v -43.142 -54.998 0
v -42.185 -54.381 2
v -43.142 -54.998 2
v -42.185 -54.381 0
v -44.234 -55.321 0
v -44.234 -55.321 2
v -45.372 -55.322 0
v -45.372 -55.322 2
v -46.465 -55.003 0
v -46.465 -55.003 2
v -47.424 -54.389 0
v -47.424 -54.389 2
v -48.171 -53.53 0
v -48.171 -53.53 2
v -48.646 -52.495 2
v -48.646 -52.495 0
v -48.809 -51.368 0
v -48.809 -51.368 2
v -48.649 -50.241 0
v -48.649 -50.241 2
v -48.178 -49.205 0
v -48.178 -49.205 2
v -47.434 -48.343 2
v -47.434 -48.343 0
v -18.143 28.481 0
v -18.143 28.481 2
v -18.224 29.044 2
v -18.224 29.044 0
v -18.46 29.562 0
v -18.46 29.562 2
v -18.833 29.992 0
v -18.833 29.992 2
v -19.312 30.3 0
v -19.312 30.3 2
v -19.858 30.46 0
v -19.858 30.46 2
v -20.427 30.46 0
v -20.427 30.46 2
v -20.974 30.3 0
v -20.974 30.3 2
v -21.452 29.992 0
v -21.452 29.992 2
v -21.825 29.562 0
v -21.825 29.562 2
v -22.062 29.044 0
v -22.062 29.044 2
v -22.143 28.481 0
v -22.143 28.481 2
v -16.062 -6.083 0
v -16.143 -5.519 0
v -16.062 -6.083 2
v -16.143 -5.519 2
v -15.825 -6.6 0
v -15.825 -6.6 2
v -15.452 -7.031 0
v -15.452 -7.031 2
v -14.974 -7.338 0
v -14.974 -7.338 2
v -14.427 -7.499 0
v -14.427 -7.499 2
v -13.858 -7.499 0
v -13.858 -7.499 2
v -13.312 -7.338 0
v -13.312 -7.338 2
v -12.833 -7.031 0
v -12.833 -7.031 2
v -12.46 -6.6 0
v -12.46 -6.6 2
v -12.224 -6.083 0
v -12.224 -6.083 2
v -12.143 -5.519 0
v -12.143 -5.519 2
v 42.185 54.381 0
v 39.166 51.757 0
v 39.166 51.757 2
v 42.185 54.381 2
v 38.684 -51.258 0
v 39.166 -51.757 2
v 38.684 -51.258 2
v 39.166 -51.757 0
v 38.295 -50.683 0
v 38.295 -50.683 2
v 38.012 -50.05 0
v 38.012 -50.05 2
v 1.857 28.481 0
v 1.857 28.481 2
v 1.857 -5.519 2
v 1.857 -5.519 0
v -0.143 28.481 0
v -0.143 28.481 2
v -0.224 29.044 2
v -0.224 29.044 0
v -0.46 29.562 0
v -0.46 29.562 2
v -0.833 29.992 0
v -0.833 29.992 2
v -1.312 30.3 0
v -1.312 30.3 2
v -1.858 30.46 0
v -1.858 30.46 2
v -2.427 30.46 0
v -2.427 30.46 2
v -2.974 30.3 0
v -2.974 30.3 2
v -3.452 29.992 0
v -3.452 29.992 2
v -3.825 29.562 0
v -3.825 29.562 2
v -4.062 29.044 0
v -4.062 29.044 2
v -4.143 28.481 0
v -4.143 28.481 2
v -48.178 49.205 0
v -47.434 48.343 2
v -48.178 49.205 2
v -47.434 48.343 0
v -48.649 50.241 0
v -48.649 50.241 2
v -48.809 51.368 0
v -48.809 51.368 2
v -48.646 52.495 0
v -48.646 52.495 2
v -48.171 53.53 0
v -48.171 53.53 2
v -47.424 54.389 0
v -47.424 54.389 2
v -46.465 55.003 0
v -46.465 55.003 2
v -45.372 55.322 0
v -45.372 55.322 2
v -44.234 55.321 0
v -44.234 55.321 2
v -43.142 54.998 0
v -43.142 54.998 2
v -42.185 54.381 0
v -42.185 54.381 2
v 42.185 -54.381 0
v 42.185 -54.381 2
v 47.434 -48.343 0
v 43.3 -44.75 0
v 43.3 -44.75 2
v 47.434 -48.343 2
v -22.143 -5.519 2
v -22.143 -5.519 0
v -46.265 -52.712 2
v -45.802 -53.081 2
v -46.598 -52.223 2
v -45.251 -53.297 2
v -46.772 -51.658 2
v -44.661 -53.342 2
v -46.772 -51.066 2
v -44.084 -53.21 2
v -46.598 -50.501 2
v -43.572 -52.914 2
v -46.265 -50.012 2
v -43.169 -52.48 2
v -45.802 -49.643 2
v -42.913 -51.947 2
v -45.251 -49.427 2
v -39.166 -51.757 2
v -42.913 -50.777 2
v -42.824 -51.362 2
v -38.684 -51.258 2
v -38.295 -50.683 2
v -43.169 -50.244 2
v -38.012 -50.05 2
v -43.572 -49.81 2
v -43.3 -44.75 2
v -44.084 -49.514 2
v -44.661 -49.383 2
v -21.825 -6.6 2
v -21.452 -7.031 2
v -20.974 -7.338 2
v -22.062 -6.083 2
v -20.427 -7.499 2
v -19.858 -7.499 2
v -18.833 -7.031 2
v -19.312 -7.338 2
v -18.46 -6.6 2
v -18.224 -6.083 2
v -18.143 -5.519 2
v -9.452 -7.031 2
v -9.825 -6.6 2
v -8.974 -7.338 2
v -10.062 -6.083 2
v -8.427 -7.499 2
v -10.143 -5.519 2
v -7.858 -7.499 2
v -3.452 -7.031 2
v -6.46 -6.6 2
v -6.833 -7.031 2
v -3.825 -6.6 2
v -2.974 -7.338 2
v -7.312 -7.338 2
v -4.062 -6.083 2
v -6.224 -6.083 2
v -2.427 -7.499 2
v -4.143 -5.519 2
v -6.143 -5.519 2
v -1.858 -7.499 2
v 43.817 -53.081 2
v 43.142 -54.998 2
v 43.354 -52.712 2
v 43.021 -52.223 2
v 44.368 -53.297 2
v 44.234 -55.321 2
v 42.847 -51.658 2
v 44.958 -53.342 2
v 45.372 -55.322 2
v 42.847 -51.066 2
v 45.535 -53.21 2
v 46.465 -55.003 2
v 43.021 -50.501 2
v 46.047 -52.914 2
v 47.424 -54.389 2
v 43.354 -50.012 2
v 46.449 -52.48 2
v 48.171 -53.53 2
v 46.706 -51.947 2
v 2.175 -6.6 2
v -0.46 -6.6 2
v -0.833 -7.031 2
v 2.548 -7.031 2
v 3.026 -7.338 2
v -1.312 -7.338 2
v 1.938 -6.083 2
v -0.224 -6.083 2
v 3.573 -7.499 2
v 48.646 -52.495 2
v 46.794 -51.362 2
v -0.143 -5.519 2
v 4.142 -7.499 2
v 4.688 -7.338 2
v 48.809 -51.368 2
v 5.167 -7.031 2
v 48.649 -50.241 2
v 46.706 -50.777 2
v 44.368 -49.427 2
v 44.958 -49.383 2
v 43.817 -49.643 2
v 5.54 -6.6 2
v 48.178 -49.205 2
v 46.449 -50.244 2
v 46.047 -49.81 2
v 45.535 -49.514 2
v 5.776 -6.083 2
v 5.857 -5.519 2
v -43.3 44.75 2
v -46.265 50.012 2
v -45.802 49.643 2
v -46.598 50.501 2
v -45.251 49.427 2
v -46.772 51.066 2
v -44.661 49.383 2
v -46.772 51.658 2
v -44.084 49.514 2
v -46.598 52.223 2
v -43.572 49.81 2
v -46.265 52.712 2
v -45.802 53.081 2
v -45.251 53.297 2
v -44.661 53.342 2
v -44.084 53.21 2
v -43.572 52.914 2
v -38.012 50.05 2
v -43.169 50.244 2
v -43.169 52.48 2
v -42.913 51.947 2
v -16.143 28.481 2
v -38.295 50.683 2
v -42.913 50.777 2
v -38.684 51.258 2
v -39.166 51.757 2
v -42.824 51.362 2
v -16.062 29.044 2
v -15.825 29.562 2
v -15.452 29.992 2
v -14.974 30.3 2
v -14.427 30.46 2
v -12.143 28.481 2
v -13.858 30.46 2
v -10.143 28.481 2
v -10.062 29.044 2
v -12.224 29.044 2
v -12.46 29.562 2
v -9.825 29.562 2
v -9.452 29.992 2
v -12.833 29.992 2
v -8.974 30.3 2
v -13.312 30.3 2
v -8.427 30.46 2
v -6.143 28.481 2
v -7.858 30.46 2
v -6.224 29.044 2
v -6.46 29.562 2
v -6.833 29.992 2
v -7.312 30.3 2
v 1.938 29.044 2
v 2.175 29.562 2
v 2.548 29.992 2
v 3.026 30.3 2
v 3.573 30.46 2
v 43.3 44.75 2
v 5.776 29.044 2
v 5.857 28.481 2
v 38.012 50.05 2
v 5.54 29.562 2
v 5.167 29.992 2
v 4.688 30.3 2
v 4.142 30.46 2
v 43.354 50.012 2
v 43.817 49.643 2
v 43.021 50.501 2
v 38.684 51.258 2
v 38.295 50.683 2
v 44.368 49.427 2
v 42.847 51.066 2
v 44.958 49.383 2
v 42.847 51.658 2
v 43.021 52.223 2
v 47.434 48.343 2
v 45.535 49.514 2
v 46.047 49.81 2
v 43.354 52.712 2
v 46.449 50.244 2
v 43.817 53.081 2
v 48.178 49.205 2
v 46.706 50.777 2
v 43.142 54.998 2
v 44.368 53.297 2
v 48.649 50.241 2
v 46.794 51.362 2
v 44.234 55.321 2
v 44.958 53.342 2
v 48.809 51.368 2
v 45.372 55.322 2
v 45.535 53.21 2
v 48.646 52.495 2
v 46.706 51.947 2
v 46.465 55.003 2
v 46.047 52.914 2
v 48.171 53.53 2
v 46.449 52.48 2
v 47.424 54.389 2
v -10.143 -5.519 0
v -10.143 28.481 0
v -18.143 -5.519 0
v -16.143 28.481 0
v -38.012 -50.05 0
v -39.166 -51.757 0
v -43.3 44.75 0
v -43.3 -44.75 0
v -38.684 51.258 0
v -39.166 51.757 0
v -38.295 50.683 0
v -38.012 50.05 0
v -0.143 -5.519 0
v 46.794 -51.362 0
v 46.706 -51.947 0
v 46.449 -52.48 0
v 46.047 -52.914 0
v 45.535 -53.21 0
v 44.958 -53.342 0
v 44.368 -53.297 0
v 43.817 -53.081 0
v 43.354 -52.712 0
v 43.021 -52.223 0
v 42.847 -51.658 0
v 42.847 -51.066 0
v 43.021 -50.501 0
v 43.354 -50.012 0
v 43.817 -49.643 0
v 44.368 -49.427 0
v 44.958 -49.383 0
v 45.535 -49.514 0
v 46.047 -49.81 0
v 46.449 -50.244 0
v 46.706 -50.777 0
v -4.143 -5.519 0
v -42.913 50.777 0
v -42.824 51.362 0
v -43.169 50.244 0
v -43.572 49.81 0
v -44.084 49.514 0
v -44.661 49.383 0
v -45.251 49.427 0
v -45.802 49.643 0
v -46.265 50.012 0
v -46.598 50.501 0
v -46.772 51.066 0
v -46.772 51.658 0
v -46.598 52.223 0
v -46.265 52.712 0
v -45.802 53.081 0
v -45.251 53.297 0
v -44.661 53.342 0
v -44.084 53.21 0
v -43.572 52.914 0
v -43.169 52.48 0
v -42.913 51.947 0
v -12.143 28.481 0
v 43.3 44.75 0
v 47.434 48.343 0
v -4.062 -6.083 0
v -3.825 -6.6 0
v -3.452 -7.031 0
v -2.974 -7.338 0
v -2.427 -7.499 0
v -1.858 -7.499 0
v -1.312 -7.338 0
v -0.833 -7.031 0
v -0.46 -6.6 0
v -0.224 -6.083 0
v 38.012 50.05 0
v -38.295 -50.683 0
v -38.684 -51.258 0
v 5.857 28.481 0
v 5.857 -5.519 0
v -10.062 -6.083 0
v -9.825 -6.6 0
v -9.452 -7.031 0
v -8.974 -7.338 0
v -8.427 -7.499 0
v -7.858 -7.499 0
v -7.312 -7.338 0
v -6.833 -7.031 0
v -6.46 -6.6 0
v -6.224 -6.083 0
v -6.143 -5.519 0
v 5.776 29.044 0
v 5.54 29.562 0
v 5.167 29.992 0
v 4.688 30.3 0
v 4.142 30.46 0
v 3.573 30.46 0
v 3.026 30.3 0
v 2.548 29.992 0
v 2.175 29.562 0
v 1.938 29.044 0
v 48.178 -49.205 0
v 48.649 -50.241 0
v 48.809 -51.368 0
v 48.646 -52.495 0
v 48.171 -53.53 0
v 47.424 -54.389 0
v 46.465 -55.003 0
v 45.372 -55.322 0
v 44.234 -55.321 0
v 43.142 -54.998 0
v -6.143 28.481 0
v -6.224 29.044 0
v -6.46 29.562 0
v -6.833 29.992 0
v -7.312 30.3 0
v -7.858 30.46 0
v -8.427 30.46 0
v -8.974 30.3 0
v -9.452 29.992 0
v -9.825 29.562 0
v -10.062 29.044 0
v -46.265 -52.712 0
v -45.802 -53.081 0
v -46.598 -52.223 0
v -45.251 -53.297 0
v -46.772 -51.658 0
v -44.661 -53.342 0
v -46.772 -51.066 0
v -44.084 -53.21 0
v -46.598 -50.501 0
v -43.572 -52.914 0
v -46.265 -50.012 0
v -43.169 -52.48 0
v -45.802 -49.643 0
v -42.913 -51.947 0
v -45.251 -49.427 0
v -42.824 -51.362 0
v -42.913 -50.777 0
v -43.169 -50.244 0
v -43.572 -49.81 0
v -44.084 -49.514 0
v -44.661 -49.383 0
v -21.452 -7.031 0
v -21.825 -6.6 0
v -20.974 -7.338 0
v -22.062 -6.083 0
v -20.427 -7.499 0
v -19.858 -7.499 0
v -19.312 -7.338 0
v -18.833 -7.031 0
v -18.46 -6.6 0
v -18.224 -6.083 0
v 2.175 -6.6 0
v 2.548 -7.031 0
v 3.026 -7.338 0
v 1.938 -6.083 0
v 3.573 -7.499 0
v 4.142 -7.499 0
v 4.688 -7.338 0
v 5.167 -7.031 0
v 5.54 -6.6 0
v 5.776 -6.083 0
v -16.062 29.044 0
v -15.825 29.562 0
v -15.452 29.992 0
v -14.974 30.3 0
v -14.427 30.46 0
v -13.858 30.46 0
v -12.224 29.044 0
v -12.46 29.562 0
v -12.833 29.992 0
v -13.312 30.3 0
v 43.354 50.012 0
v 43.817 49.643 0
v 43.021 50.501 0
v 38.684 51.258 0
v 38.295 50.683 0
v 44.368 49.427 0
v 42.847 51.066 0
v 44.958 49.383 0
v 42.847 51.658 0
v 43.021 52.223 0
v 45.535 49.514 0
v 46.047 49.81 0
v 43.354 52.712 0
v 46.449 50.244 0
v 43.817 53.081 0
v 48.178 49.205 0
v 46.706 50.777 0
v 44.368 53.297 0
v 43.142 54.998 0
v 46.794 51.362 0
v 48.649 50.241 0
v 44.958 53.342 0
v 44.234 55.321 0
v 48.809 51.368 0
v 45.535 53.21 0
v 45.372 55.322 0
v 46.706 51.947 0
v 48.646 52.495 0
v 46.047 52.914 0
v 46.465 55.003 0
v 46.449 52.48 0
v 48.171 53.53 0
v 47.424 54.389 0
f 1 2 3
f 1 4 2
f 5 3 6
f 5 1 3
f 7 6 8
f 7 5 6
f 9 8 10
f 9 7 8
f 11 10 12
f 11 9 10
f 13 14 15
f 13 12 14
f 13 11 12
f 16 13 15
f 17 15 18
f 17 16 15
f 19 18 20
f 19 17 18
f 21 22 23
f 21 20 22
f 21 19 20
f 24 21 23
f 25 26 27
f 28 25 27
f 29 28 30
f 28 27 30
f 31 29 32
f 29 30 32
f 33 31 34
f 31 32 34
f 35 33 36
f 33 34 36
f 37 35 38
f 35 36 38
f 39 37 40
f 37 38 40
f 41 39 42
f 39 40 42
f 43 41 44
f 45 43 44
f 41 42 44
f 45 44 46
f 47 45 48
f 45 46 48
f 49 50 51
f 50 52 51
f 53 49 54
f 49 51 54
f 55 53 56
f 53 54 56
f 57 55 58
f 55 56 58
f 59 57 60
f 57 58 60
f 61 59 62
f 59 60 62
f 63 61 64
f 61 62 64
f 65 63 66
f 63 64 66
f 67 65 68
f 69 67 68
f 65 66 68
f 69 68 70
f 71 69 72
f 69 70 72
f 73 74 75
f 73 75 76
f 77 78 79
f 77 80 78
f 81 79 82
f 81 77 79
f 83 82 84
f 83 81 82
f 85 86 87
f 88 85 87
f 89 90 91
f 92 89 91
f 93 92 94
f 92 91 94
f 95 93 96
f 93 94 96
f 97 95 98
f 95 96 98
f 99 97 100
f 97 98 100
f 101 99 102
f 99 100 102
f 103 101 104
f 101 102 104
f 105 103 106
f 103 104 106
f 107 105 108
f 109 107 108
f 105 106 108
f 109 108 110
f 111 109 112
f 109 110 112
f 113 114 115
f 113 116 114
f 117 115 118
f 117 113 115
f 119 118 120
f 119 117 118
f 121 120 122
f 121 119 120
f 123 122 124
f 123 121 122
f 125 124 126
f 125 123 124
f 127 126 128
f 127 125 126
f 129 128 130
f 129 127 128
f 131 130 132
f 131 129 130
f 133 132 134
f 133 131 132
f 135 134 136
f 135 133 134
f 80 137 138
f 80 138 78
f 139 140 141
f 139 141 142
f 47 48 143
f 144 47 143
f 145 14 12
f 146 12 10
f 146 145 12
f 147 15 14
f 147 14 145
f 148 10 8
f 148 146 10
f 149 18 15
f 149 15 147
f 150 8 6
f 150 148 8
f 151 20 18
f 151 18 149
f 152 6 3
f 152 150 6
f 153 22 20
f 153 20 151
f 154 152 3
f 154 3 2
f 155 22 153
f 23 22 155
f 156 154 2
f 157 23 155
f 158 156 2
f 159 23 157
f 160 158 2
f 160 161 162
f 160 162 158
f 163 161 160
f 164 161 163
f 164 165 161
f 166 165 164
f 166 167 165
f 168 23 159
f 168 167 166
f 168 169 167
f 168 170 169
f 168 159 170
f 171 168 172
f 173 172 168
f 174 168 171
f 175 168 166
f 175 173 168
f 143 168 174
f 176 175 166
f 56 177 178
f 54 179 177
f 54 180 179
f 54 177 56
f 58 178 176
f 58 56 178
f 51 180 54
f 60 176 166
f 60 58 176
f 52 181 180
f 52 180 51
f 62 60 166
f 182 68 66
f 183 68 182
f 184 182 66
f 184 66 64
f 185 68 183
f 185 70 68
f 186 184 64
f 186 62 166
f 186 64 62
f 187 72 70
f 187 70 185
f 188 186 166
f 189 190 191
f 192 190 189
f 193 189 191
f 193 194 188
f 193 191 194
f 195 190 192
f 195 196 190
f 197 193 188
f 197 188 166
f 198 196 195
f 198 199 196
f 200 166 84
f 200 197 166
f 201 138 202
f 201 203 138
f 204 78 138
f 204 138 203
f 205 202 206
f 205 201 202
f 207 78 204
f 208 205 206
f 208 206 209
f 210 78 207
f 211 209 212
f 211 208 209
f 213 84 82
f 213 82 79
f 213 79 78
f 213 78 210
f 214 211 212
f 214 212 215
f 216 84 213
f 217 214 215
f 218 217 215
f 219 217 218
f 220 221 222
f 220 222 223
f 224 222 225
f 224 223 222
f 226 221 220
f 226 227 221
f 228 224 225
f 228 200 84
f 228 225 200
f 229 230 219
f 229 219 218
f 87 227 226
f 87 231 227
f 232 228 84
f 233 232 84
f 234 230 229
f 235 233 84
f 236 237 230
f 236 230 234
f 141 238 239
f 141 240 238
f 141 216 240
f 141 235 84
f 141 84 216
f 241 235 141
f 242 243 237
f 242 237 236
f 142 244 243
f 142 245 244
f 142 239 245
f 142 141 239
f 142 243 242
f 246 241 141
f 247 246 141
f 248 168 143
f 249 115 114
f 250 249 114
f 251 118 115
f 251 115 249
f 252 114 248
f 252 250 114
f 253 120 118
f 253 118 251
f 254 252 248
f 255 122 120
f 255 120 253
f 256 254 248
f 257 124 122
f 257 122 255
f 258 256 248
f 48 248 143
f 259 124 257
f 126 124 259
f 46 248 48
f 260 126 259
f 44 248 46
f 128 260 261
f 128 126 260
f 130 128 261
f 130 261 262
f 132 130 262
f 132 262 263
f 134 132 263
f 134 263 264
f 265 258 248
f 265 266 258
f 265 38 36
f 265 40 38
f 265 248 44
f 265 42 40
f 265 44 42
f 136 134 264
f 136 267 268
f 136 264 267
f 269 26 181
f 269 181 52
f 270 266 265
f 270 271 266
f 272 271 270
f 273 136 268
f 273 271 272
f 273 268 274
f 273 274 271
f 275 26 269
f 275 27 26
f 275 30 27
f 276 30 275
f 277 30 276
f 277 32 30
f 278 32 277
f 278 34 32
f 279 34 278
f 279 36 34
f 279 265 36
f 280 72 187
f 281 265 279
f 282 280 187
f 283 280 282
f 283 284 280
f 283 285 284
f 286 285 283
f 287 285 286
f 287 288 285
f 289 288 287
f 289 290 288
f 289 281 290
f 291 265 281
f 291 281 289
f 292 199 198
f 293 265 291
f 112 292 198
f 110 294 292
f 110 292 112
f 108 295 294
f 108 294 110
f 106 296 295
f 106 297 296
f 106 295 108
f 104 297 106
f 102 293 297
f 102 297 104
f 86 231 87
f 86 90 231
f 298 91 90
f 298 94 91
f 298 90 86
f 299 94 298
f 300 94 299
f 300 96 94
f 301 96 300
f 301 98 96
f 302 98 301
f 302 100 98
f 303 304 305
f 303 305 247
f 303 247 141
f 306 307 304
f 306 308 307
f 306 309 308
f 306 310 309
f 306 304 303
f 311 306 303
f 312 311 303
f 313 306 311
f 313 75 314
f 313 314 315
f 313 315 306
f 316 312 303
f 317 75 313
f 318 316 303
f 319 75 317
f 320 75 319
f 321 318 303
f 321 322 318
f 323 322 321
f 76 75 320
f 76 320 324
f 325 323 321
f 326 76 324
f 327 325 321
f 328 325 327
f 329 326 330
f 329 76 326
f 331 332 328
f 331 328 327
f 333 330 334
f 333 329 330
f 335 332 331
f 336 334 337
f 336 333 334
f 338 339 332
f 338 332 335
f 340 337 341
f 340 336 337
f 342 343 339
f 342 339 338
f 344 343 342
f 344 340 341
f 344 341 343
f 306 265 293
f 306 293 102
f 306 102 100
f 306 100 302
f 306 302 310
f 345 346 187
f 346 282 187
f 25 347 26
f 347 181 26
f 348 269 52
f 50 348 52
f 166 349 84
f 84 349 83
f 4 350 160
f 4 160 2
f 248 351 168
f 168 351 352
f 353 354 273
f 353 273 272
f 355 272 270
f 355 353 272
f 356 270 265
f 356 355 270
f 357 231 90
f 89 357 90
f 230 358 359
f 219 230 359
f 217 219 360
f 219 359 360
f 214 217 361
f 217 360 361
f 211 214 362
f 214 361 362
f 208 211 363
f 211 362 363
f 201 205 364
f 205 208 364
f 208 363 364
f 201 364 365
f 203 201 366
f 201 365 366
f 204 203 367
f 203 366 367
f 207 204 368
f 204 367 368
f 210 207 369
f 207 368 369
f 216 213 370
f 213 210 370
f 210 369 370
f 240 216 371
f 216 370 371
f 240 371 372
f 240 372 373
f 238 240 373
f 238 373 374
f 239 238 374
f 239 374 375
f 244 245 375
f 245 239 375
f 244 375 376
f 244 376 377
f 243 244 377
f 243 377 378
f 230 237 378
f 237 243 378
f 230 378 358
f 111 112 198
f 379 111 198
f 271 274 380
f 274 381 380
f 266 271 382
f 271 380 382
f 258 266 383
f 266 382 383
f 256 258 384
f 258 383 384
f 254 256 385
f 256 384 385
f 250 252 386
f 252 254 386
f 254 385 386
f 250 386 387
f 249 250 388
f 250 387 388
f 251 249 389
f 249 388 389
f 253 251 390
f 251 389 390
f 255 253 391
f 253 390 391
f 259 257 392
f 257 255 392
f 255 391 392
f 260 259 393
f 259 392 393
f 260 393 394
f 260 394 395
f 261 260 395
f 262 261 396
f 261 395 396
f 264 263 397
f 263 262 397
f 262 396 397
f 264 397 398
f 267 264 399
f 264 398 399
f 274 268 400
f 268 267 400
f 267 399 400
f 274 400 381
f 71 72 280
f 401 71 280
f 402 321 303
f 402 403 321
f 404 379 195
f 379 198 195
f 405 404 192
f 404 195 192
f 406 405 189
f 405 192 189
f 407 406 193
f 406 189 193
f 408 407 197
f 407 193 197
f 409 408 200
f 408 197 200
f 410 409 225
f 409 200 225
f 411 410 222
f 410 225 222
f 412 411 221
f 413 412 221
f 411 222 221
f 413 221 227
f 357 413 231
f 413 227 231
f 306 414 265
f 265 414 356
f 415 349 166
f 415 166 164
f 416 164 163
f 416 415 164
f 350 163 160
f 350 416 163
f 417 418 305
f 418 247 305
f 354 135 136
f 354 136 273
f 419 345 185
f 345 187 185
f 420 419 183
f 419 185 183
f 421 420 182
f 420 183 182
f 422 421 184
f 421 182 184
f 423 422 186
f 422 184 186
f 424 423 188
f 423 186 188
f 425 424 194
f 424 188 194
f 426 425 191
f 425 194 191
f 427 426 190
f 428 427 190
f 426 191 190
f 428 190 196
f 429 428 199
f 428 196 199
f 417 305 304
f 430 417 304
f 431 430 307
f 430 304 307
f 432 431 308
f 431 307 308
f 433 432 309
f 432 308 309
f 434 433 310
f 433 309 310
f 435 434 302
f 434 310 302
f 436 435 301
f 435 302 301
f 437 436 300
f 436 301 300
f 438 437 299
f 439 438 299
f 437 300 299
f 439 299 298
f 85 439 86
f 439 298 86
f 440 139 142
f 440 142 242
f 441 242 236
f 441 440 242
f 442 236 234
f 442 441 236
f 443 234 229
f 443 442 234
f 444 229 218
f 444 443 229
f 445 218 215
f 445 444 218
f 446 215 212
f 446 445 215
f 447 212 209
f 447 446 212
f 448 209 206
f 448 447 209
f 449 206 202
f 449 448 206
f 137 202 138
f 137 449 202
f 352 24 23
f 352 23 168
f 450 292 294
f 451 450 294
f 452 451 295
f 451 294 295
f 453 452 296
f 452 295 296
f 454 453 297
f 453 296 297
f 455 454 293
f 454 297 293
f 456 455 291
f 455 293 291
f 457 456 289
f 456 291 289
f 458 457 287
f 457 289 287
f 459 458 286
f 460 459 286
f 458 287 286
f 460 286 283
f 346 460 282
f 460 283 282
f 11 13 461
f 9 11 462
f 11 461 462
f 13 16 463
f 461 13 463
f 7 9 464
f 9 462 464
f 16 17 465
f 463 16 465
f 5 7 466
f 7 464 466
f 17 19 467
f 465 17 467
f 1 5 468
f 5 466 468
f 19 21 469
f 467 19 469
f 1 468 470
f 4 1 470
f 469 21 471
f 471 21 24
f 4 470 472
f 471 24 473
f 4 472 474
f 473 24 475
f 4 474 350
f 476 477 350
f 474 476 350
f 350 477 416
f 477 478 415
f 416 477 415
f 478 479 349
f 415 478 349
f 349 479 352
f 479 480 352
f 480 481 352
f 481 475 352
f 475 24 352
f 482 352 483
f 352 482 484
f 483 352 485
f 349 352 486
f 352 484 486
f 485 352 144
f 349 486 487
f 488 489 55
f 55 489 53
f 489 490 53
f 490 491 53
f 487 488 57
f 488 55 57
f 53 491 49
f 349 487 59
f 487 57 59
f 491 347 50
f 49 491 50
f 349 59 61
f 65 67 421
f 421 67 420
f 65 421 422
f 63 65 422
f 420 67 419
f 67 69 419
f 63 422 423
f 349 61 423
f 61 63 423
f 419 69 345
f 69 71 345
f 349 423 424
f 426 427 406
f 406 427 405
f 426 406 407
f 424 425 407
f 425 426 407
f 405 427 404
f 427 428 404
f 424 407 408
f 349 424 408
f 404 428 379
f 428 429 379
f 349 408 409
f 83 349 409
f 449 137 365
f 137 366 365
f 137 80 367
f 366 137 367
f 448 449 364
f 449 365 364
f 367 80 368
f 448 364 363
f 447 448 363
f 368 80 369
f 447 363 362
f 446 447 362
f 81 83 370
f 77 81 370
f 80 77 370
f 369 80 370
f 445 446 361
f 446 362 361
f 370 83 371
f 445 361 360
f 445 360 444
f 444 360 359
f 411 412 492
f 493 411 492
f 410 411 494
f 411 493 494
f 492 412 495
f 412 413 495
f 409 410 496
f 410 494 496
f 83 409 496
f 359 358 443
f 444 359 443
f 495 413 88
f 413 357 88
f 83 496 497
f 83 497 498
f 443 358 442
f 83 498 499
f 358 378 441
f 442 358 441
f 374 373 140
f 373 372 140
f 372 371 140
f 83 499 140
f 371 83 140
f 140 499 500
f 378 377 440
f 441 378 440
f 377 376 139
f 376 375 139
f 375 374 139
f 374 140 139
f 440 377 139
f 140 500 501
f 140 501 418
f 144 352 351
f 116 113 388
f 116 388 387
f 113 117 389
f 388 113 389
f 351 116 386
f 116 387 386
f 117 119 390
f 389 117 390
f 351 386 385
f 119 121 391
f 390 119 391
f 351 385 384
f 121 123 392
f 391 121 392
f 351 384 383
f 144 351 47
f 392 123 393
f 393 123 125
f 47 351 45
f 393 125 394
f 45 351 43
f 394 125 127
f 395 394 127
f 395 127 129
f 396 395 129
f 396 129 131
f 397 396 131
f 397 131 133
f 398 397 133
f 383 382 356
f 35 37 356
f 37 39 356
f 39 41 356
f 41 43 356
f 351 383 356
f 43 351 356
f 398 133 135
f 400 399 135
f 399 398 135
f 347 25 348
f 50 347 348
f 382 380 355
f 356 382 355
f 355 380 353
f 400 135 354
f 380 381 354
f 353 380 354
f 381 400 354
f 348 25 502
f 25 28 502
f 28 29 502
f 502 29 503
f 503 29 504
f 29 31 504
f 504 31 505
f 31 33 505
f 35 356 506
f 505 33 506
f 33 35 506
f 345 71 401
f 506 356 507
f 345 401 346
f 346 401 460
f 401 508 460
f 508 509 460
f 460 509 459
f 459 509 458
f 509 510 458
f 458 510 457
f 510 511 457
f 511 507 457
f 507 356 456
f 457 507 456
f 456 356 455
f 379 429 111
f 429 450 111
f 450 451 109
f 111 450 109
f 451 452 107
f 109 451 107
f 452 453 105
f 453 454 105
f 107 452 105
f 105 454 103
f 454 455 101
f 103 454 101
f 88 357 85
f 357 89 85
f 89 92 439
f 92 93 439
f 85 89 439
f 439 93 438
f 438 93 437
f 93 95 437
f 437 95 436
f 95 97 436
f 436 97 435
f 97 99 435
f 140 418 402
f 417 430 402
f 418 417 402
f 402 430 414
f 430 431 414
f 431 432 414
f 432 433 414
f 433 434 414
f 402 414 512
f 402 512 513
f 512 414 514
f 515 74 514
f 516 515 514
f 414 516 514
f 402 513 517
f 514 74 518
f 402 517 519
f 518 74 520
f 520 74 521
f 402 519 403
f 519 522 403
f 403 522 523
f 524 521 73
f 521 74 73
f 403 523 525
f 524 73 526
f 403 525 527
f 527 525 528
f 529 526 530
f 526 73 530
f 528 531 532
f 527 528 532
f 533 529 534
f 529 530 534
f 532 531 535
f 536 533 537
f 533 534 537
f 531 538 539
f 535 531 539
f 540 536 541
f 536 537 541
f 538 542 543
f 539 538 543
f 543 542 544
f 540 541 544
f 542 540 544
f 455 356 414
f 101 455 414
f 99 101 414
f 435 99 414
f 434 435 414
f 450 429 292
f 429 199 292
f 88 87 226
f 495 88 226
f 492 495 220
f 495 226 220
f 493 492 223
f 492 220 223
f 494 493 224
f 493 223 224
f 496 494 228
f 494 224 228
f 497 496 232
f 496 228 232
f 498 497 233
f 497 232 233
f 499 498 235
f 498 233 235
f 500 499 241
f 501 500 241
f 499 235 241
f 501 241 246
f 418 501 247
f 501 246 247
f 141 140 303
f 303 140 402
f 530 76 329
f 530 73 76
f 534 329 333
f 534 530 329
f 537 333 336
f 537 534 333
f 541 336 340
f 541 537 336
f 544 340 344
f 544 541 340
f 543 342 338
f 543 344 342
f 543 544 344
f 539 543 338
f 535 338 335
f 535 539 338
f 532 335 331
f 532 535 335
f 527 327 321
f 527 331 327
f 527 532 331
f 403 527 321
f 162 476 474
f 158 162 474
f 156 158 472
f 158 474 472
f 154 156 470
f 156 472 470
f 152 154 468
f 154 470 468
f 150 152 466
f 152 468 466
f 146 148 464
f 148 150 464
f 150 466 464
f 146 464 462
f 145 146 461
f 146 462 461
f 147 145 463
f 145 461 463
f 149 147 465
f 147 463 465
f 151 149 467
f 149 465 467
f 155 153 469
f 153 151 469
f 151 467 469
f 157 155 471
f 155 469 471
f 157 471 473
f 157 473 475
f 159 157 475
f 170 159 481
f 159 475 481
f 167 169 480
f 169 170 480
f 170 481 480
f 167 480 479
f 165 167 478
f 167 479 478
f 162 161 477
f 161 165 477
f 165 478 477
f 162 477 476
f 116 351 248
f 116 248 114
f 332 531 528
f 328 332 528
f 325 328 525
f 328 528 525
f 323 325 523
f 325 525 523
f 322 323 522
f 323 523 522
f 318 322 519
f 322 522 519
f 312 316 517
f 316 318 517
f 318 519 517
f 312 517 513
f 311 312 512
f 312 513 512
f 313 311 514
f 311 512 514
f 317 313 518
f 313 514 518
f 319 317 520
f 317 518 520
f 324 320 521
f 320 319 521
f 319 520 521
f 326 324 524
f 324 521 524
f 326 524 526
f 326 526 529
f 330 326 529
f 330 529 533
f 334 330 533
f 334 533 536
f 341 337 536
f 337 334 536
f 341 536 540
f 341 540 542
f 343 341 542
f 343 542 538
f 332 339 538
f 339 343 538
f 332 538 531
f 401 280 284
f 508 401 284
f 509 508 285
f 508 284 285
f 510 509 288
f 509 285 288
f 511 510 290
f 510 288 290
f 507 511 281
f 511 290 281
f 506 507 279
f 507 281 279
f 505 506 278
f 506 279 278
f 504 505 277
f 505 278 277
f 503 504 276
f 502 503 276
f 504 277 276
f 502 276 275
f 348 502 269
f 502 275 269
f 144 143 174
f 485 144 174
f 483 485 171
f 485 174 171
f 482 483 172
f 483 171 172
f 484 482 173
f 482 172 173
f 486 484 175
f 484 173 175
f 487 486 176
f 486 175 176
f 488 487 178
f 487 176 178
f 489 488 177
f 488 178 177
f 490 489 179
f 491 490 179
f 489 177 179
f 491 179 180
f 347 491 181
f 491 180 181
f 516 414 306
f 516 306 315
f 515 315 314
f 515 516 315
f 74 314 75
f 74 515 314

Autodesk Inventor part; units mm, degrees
ref_plane "YZ Plane" through (0, 0, 0) normal (1, 0, 0) x (0, 1, 0)
ref_plane "XZ Plane" through (0, 0, 0) normal (0, 1, 0) x (-1, 0, 0)
ref_plane "XY Plane" through (0, 0, 0) normal (0, 0, 1) x (1, 0, 0)
sketch "Sketch1" plane through (0, 0, 0) normal (0, 0, 1) x (1, 0, 0)
  circle A0 centre (44.8094, -51.3621) radius 1.985 projected
  circle A1 centre (-44.8094, -51.3621) radius 1.985 projected
  circle A2 centre (-44.8094, 51.3621) radius 1.985 projected
  circle A3 centre (44.8094, 51.3621) radius 1.985 projected
  line L0 (38.0119, 50.05) -> (-38.0119, 50.05) projected
  arc A4 (-38.0119, 50.05) -> (-39.1663, 51.7567) centre (-41.7906, 48.7379) ccw projected
  line L1 (-42.1852, 54.381) -> (-39.1663, 51.7567) projected
  arc A5 (-42.1852, 54.381) -> (-47.4337, 48.3433) centre (-44.8094, 51.3621) ccw projected
  line L2 (-43.3, 44.7499) -> (-47.4337, 48.3433) projected
  line L3 (-43.3, 44.7499) -> (-43.3, -44.7499) projected
  line L4 (-47.4337, -48.3433) -> (-43.3, -44.7499) projected
  arc A6 (-47.4337, -48.3433) -> (-42.1852, -54.381) centre (-44.8094, -51.3621) ccw projected
  line L5 (-39.1663, -51.7567) -> (-42.1852, -54.381) projected
  arc A7 (-39.1663, -51.7567) -> (-38.0119, -50.05) centre (-41.7906, -48.7379) ccw projected
  line L6 (-38.0119, -50.05) -> (38.0119, -50.05) projected
  arc A8 (38.0119, -50.05) -> (39.1663, -51.7567) centre (41.7906, -48.7379) ccw projected
  line L7 (42.1852, -54.381) -> (39.1663, -51.7567) projected
  arc A9 (42.1852, -54.381) -> (47.4337, -48.3433) centre (44.8094, -51.3621) ccw projected
  line L8 (43.3, -44.7499) -> (47.4337, -48.3433) projected
  line L9 (43.3, -44.7499) -> (43.3, 44.7499) projected
  line L10 (47.4337, 48.3433) -> (43.3, 44.7499) projected
  arc A10 (47.4337, 48.3433) -> (42.1852, 54.381) centre (44.8094, 51.3621) ccw projected
  line L11 (39.1663, 51.7567) -> (42.1852, 54.381) projected
  arc A11 (39.1663, 51.7567) -> (38.0119, 50.05) centre (41.7906, 48.7379) ccw projected
  line L12 (-40.1, -44.85) -> (-40.1, 44.85) projected
  arc A12 (-38.1, 46.85) -> (-40.1, 44.85) centre (-38.1, 44.85) ccw projected
  line L13 (-38.1, 46.85) -> (38.1, 46.85) projected
  arc A13 (40.1, 44.85) -> (38.1, 46.85) centre (38.1, 44.85) ccw projected
  line L14 (40.1, 44.85) -> (40.1, -44.85) projected
  arc A14 (38.1, -46.85) -> (40.1, -44.85) centre (38.1, -44.85) ccw projected
  line L15 (38.1, -46.85) -> (-38.1, -46.85) projected
  arc A15 (-40.1, -44.85) -> (-38.1, -46.85) centre (-38.1, -44.85) ccw projected
  point P0 (0, 0)
extrude "Extrusion1" add sketch "Sketch1" along normal blind 2 contours A11 L11 A10 L10 L9 L8 A9 L7 A8 L6 A7 L5 A6 L4 L3 L2 A5 L1 A4 L0 | L12 A12 L13 A13 L14 A14 L15 A15
sketch "Sketch3" plane through (0, 0, 2) normal (0, 0, 1) x (1, 0, 0)
  line L0 (-15.2986, 18.4674) -> (-1.1867, 18.4674) projected
  line L1 (-1.1867, 18.4674) -> (-1.1867, 4.4942) projected
  line L2 (-1.1867, 4.4942) -> (-15.2986, 4.4942) projected
  line L3 (-15.2986, 4.4942) -> (-15.2986, 18.4674) projected
  line L4 (-8.1427, -5.5192) -> (-8.1427, 28.4808) construction
  line L5 (-6.1427, -5.5192) -> (-6.1427, 28.4808)
  line L6 (-10.1427, 28.4808) -> (-10.1427, -5.5192)
  arc A0 (-10.1427, -5.5192) -> (-6.1427, -5.5192) centre (-8.1427, -5.5192) ccw
  arc A1 (-6.1427, 28.4808) -> (-10.1427, 28.4808) centre (-8.1427, 28.4808) ccw
  arc A2 (-0.1427, 28.4808) -> (-4.1427, 28.4808) centre (-2.1427, 28.4808) ccw
  line L7 (-0.1427, -5.5192) -> (-0.1427, 28.4808)
  line L8 (-4.1427, 28.4808) -> (-4.1427, -5.5192)
  arc A3 (-4.1427, -5.5192) -> (-0.1427, -5.5192) centre (-2.1427, -5.5192) ccw
  line L9 (5.8573, -5.5192) -> (5.8573, 28.4808)
  arc A4 (5.8573, 28.4808) -> (1.8573, 28.4808) centre (3.8573, 28.4808) ccw
  line L10 (1.8573, 28.4808) -> (1.8573, -5.5192)
  arc A5 (1.8573, -5.5192) -> (5.8573, -5.5192) centre (3.8573, -5.5192) ccw
  line L11 (-16.1427, 28.4808) -> (-16.1427, -5.5192)
  arc A6 (-12.1427, 28.4808) -> (-16.1427, 28.4808) centre (-14.1427, 28.4808) ccw
  line L12 (-12.1427, -5.5192) -> (-12.1427, 28.4808)
  arc A7 (-16.1427, -5.5192) -> (-12.1427, -5.5192) centre (-14.1427, -5.5192) ccw
  line L13 (-22.1427, 28.4808) -> (-22.1427, -5.5192)
  arc A8 (-18.1427, 28.4808) -> (-22.1427, 28.4808) centre (-20.1427, 28.4808) ccw
  line L14 (-18.1427, -5.5192) -> (-18.1427, 28.4808)
  arc A9 (-22.1427, -5.5192) -> (-18.1427, -5.5192) centre (-20.1427, -5.5192) ccw
  point P0 (0, 0)
  point P1 (-8.1427, 11.4808)
  dimension "d8" = 17
  dimension "d9" = 4
  dimension "d12" = 6
  dimension "d19" = 6
  dimension "d26" = 6
extrude "Extrusion3" cut sketch "Sketch3" against normal up to surface (2 mm away) contours L3 L2 L12 A7 L11 A6 L0 | L0 L12 L2 L3 | L6 A1 L5 L0 | L0 L5 L2 L6 | L2 L5 A0 L6 | L8 A2 L7 A3 L2 L1 L0 | L0 L1 L2 L8 | A5 L10 A4 L9 | A8 L14 A9 L13
properties part number "Case Cover Rev D"
